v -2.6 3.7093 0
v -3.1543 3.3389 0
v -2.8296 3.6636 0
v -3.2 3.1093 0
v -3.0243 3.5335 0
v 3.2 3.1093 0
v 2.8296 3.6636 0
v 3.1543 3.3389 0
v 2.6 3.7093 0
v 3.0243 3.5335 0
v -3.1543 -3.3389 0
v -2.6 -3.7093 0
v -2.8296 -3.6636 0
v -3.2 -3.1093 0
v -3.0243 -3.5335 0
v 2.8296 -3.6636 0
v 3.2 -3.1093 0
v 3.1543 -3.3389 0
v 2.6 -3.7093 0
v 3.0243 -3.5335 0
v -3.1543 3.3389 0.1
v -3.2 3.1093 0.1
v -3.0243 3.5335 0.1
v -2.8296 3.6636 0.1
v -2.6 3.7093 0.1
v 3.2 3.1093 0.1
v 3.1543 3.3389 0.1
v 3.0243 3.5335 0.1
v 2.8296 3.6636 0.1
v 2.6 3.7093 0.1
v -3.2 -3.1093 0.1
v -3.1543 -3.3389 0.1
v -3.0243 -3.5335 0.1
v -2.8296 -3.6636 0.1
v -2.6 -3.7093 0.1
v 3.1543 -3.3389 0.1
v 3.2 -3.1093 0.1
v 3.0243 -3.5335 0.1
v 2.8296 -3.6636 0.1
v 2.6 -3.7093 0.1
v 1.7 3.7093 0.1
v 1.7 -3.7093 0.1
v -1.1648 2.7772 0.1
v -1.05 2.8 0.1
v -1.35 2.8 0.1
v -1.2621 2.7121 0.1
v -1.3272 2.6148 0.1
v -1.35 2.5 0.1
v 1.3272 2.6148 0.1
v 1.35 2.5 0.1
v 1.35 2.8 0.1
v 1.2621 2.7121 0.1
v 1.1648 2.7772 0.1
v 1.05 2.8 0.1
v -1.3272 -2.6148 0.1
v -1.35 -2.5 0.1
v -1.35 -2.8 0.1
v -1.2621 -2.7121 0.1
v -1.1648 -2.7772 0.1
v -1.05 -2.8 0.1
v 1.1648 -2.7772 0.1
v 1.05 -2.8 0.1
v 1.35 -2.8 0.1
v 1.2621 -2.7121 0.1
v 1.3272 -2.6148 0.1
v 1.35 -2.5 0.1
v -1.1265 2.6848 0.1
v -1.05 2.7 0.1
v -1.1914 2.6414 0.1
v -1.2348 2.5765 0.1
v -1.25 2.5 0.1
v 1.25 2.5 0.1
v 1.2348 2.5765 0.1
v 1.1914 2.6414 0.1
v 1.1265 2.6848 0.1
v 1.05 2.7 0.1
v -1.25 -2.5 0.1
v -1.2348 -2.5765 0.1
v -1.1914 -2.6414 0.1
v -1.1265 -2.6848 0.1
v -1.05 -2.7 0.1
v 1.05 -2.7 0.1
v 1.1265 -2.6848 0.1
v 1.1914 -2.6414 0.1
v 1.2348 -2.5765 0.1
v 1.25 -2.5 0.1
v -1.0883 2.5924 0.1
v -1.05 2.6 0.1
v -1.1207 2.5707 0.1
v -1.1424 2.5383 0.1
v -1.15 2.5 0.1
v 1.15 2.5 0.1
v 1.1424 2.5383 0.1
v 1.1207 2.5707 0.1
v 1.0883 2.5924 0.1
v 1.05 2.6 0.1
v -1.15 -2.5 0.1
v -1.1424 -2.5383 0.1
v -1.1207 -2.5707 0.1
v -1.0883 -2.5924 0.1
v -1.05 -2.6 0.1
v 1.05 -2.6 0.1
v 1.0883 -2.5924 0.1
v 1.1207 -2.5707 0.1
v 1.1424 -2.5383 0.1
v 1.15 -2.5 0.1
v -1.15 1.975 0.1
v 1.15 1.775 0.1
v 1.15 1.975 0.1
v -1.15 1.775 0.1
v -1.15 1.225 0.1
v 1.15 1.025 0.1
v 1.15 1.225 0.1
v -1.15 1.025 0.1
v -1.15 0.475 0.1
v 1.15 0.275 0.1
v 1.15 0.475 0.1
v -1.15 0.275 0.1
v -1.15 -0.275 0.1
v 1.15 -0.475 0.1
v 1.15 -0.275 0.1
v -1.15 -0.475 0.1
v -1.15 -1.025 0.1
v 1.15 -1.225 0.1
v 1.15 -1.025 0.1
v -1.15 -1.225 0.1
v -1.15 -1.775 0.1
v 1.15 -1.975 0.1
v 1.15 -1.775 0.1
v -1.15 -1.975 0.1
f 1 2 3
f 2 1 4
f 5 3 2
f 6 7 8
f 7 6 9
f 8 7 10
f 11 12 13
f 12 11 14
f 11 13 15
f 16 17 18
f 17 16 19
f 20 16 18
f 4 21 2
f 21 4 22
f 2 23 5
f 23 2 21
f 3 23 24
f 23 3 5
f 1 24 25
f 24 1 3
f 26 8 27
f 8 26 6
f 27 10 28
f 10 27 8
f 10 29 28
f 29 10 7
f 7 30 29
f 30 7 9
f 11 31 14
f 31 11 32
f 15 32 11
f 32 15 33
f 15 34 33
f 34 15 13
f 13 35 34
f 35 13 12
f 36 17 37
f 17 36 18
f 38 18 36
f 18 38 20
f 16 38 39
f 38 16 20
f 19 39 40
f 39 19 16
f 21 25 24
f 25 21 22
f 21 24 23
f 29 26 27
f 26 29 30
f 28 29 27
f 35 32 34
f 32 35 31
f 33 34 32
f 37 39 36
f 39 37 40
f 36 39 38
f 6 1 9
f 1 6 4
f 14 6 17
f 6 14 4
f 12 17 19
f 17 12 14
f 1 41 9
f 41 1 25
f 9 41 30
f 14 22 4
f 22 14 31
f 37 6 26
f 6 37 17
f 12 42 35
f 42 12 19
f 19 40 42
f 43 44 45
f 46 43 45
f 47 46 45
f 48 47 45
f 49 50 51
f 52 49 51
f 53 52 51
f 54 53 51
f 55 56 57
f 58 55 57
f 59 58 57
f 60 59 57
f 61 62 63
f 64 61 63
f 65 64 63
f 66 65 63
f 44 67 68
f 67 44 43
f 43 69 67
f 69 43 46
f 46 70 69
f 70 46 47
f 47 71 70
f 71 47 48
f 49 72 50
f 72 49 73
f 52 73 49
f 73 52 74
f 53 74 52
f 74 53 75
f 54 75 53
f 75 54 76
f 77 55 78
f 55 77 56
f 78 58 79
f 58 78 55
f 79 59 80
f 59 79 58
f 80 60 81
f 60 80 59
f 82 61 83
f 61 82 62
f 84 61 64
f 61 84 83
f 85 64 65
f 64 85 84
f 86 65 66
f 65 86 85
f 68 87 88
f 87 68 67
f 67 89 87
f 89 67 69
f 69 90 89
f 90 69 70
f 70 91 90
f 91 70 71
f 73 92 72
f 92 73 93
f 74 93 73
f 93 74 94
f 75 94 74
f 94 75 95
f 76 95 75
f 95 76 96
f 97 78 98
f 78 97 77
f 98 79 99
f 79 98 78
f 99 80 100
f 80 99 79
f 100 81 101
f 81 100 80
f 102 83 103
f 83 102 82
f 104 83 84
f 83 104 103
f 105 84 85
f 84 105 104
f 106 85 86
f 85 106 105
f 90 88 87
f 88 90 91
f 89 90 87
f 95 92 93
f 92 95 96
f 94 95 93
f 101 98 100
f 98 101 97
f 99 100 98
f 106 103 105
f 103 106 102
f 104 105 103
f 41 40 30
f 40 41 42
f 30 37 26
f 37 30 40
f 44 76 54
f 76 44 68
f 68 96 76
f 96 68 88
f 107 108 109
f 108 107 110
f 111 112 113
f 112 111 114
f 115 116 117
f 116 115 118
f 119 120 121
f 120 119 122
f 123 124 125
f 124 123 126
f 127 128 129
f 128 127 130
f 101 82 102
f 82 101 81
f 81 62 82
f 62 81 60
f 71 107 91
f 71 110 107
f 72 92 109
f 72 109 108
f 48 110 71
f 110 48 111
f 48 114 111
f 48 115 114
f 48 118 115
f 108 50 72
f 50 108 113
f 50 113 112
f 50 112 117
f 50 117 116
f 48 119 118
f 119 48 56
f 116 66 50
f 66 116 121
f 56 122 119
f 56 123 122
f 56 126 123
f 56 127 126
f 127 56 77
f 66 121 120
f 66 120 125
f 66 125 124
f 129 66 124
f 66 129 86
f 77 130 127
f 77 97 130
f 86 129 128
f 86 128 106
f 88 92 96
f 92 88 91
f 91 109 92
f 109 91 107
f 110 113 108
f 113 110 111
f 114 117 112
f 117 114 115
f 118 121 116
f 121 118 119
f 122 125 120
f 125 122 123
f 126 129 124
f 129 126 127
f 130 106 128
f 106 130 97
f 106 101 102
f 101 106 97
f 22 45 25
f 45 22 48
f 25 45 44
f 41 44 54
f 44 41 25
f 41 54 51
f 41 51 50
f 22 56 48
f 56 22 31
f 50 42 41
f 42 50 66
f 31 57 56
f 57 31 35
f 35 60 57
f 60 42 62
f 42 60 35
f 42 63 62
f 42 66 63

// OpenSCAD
// file: ../p/1-4ring2.scad
use <../lib.scad>
function ldraw_lib__1_4ring2() = [
// 0 Ring  2 x 0.25
// 0 Name: 1-4ring2.dat
// 0 Author: Franklin W. Cain [fwcain]
// 0 !LDRAW_ORG Primitive UPDATE 2015-01
// 0 !LICENSE Licensed under CC BY 2.0 and CC BY 4.0 : see CAreadme.txt
// 
// 0 BFC CERTIFY CCW
  [0,"BFC","CERTIFY"],
  [0,"BFC","CCW"],
// 
// 0 !HISTORY 2001-12-31 [PTadmin] Official Update 2001-03
// 0 !HISTORY 2007-06-22 [PTadmin] Header formatted for Contributor Agreement
// 0 !HISTORY 2008-07-01 [PTadmin] Official Update 2008-01
// 0 !HISTORY 2012-02-16 [Philo] Changed to CCW
// 0 !HISTORY 2012-03-30 [PTadmin] Official Update 2012-01
// 0 !HISTORY 2014-12-25 [MMR1988] Fixed a rounding issue
// 0 !HISTORY 2015-10-11 [PTadmin] Official Update 2015-01
// 
// 
// 4 16 3 0 0 2.7717 0 1.1481 1.8478 0 0.7654 2 0 0
  [4,16,3,0,0,2.7717,0,1.1481,1.8478,0,0.7654,2,0,0],
// 4 16 2.7717 0 1.1481 2.1213 0 2.1213 1.4142 0 1.4142 1.8478 0 0.7654
  [4,16,2.7717,0,1.1481,2.1213,0,2.1213,1.4142,0,1.4142,1.8478,0,0.7654],
// 4 16 2.1213 0 2.1213 1.1481 0 2.7717 0.7654 0 1.8478 1.4142 0 1.4142
  [4,16,2.1213,0,2.1213,1.1481,0,2.7717,0.7654,0,1.8478,1.4142,0,1.4142],
// 4 16 1.1481 0 2.7717 0 0 3 0 0 2 0.7654 0 1.8478
  [4,16,1.1481,0,2.7717,0,0,3,0,0,2,0.7654,0,1.8478],
// 0 // Build by Primitive Generator 2
];
makepoly(ldraw_lib__1_4ring2(), line=0.2);
// file: ../p/1-4ring1.scad
use <../lib.scad>
function ldraw_lib__1_4ring1() = [
// 0 Ring  1 x 0.25
// 0 Name: 1-4ring1.dat
// 0 Author: Chris Dee [cwdee]
// 0 !LDRAW_ORG Primitive UPDATE 2012-01
// 0 !LICENSE Licensed under CC BY 2.0 and CC BY 4.0 : see CAreadme.txt
// 
// 0 BFC CERTIFY CCW
  [0,"BFC","CERTIFY"],
  [0,"BFC","CCW"],
// 
// 0 !HISTORY 2000-05-07 [PTadmin] Official Update 2000-01
// 0 !HISTORY 2002-11-22 [hafhead] Added BFC statement
// 0 !HISTORY 2002-11-30 [PTadmin] Official Update 2002-05
// 0 !HISTORY 2007-06-22 [PTadmin] Header formatted for Contributor Agreement
// 0 !HISTORY 2008-07-01 [PTadmin] Official Update 2008-01
// 0 !HISTORY 2012-02-16 [Philo] Changed to CCW
// 0 !HISTORY 2012-03-30 [PTadmin] Official Update 2012-01
// 
// 
// 4 16 2 0 0 1.8478 0 0.7654 0.9239 0 0.3827 1 0 0
  [4,16,2,0,0,1.8478,0,0.7654,0.9239,0,0.3827,1,0,0],
// 4 16 1.8478 0 0.7654 1.4142 0 1.4142 0.7071 0 0.7071 0.9239 0 0.3827
  [4,16,1.8478,0,0.7654,1.4142,0,1.4142,0.7071,0,0.7071,0.9239,0,0.3827],
// 4 16 1.4142 0 1.4142 0.7654 0 1.8478 0.3827 0 0.9239 0.7071 0 0.7071
  [4,16,1.4142,0,1.4142,0.7654,0,1.8478,0.3827,0,0.9239,0.7071,0,0.7071],
// 4 16 0.7654 0 1.8478 0 0 2 0 0 1 0.3827 0 0.9239
  [4,16,0.7654,0,1.8478,0,0,2,0,0,1,0.3827,0,0.9239],
];
makepoly(ldraw_lib__1_4ring1(), line=0.2);
// file: ../p/1-4ndis.scad
use <../lib.scad>
function ldraw_lib__1_4ndis() = [
// 0 Disc Negative 0.25
// 0 Name: 1-4ndis.dat
// 0 Author: James Jessiman
// 0 !LDRAW_ORG Primitive UPDATE 2012-01
// 0 !LICENSE Licensed under CC BY 2.0 and CC BY 4.0 : see CAreadme.txt
// 
// 0 BFC CERTIFY CCW
  [0,"BFC","CERTIFY"],
  [0,"BFC","CCW"],
// 
// 0 !HISTORY 2002-03-23 [sbliss] Added BFC Statement
// 0 !HISTORY 2002-04-25 [PTadmin] Official Update 2002-02
// 0 !HISTORY 2007-06-22 [PTadmin] Header formatted for Contributor Agreement
// 0 !HISTORY 2008-07-01 [PTadmin] Official Update 2008-01
// 0 !HISTORY 2012-02-16 [Philo] Changed to CCW
// 0 !HISTORY 2012-03-30 [PTadmin] Official Update 2012-01
// 
// 
// 3 16 0.9239 0 0.3827 1 0 0 1 0 1
  [3,16,0.9239,0,0.3827,1,0,0,1,0,1],
// 3 16 0.7071 0 0.7071 0.9239 0 0.3827 1 0 1
  [3,16,0.7071,0,0.7071,0.9239,0,0.3827,1,0,1],
// 3 16 0.3827 0 0.9239 0.7071 0 0.7071 1 0 1
  [3,16,0.3827,0,0.9239,0.7071,0,0.7071,1,0,1],
// 3 16 0 0 1 0.3827 0 0.9239 1 0 1
  [3,16,0,0,1,0.3827,0,0.9239,1,0,1],
];
makepoly(ldraw_lib__1_4ndis(), line=0.2);
// file: ../p/1-4cyli.scad
use <../lib.scad>
function ldraw_lib__1_4cyli() = [
// 0 Cylinder 0.25
// 0 Name: 1-4cyli.dat
// 0 Author: James Jessiman
// 0 !LDRAW_ORG Primitive UPDATE 2012-01
// 0 !LICENSE Licensed under CC BY 2.0 and CC BY 4.0 : see CAreadme.txt
// 
// 0 BFC CERTIFY CCW
  [0,"BFC","CERTIFY"],
  [0,"BFC","CCW"],
// 
// 0 !HISTORY 2002-03-23 [sbliss] Added BFC statement.
// 0 !HISTORY 2002-04-25 [PTadmin] Official Update 2002-02
// 0 !HISTORY 2007-06-22 [PTadmin] Header formatted for Contributor Agreement
// 0 !HISTORY 2008-07-01 [PTadmin] Official Update 2008-01
// 0 !HISTORY 2012-02-16 [Philo] Changed to CCW
// 0 !HISTORY 2012-03-30 [PTadmin] Official Update 2012-01
// 
// 
// 4 16 1 1 0 0.9239 1 0.3827 0.9239 0 0.3827 1 0 0
  [4,16,1,1,0,0.9239,1,0.3827,0.9239,0,0.3827,1,0,0],
// 5 24 1 0 0 1 1 0 0.9239 0 0.3827 1 0 -1
  [5,24,1,0,0,1,1,0,0.9239,0,0.3827,1,0,-1],
// 4 16 0.9239 1 0.3827 0.7071 1 0.7071 0.7071 0 0.7071 0.9239 0 0.3827
  [4,16,0.9239,1,0.3827,0.7071,1,0.7071,0.7071,0,0.7071,0.9239,0,0.3827],
// 5 24 0.9239 0 0.3827 0.9239 1 0.3827 0.7071 0 0.7071 1 0 0
  [5,24,0.9239,0,0.3827,0.9239,1,0.3827,0.7071,0,0.7071,1,0,0],
// 4 16 0.7071 1 0.7071 0.3827 1 0.9239 0.3827 0 0.9239 0.7071 0 0.7071
  [4,16,0.7071,1,0.7071,0.3827,1,0.9239,0.3827,0,0.9239,0.7071,0,0.7071],
// 5 24 0.7071 0 0.7071 0.7071 1 0.7071 0.3827 0 0.9239 0.9239 0 0.3827
  [5,24,0.7071,0,0.7071,0.7071,1,0.7071,0.3827,0,0.9239,0.9239,0,0.3827],
// 4 16 0.3827 1 0.9239 0 1 1 0 0 1 0.3827 0 0.9239
  [4,16,0.3827,1,0.9239,0,1,1,0,0,1,0.3827,0,0.9239],
// 5 24 0.3827 0 0.9239 0.3827 1 0.9239 0 0 1 0.7071 0 0.7071
  [5,24,0.3827,0,0.9239,0.3827,1,0.9239,0,0,1,0.7071,0,0.7071],
// 5 24 0 0 1 0 1 1 0.3827 0 0.9239 -1 0 1
  [5,24,0,0,1,0,1,1,0.3827,0,0.9239,-1,0,1],
];
makepoly(ldraw_lib__1_4cyli(), line=0.2);
// file: ../p/1-4chrd.scad
use <../lib.scad>
function ldraw_lib__1_4chrd() = [
// 0 Chord 0.25
// 0 Name: 1-4chrd.dat
// 0 Author: Tony Hafner [hafhead]
// 0 !LDRAW_ORG Primitive UPDATE 2012-02
// 0 !LICENSE Licensed under CC BY 2.0 and CC BY 4.0 : see CAreadme.txt
// 
// 0 BFC CERTIFY CCW
  [0,"BFC","CERTIFY"],
  [0,"BFC","CCW"],
// 
// 0 !HISTORY 2004-04-22 [PTadmin] Official Update 2004-02
// 0 !HISTORY 2007-10-09 [PTadmin] Header formatted for Contributor Agreement
// 0 !HISTORY 2008-07-01 [PTadmin] Official Update 2008-01
// 0 !HISTORY 2012-08-02 [MMR1988] Re-creation with PrimGen2 and Rectifier
// 0 !HISTORY 2012-08-09 [PTadmin] Official Update 2012-02
// 
// 
// 4 16 0.9239 0 0.3827 0.3827 0 0.9239 0 0 1 1 0 0
  [4,16,0.9239,0,0.3827,0.3827,0,0.9239,0,0,1,1,0,0],
// 3 16 0.7071 0 0.7071 0.3827 0 0.9239 0.9239 0 0.3827
  [3,16,0.7071,0,0.7071,0.3827,0,0.9239,0.9239,0,0.3827],
];
makepoly(ldraw_lib__1_4chrd(), line=0.2);
// main file
use <../lib.scad>
use <../p/1-4chrd.scad>
use <../p/1-4cyli.scad>
use <../p/1-4ndis.scad>
use <../p/1-4ring1.scad>
use <../p/1-4ring2.scad>
function ldraw_lib__6142622g() = [
// 0 Sticker  1.0 x  0.9 with Dark Grey Exhaust Pipe on Black and Yellow Background Right
// 0 Name: 6142622g.dat
// 0 Author: Massimo Maso [Sirio]
// 0 !LDRAW_ORG Part UPDATE 2022-03
// 0 !LICENSE Licensed under CC BY 2.0 and CC BY 4.0 : see CAreadme.txt
// 
// 0 BFC CERTIFY CCW
  [0,"BFC","CERTIFY"],
  [0,"BFC","CCW"],
// 
// 0 !KEYWORDS Chevrolet, Corvette, Set 75870, Speed Champions
// 
// 0 !HISTORY 2022-05-07 [PTadmin] Official Update 2022-03
// 
// 
// 0 // Primitives
// 
// 1 16 -6.5 0 7.7732 -1.5 0 0 0 -1 0 0 0 1.5 1-4chrd.dat
  [1,16,-6.5,0,7.7732,-1.5,0,0,0,-1,0,0,0,1.5, ldraw_lib__1_4chrd()],
// 1 16 6.5 0 7.7732 1.5 0 0 0 -1 0 0 0 1.5 1-4chrd.dat
  [1,16,6.5,0,7.7732,1.5,0,0,0,-1,0,0,0,1.5, ldraw_lib__1_4chrd()],
// 1 16 -6.5 0 -7.7732 -1.5 0 0 0 -1 0 0 0 -1.5 1-4chrd.dat
  [1,16,-6.5,0,-7.7732,-1.5,0,0,0,-1,0,0,0,-1.5, ldraw_lib__1_4chrd()],
// 1 16 6.5 0 -7.7732 1.5 0 0 0 -1 0 0 0 -1.5 1-4chrd.dat
  [1,16,6.5,0,-7.7732,1.5,0,0,0,-1,0,0,0,-1.5, ldraw_lib__1_4chrd()],
// 1 16 -6.5 0 7.7732 -1.5 0 0 0 -.25 0 0 0 1.5 1-4cyli.dat
  [1,16,-6.5,0,7.7732,-1.5,0,0,0,-.25,0,0,0,1.5, ldraw_lib__1_4cyli()],
// 1 16 6.5 0 7.7732 1.5 0 0 0 -.25 0 0 0 1.5 1-4cyli.dat
  [1,16,6.5,0,7.7732,1.5,0,0,0,-.25,0,0,0,1.5, ldraw_lib__1_4cyli()],
// 1 16 -6.5 0 -7.7732 -1.5 0 0 0 -.25 0 0 0 -1.5 1-4cyli.dat
  [1,16,-6.5,0,-7.7732,-1.5,0,0,0,-.25,0,0,0,-1.5, ldraw_lib__1_4cyli()],
// 1 16 6.5 0 -7.7732 1.5 0 0 0 -.25 0 0 0 -1.5 1-4cyli.dat
  [1,16,6.5,0,-7.7732,1.5,0,0,0,-.25,0,0,0,-1.5, ldraw_lib__1_4cyli()],
// 1 0 -6.5 -.25 7.7732 -1.5 0 0 0 1 0 0 0 1.5 1-4chrd.dat
  [1,0,-6.5,-.25,7.7732,-1.5,0,0,0,1,0,0,0,1.5, ldraw_lib__1_4chrd()],
// 1 14 6.5 -.25 7.7732 1.5 0 0 0 1 0 0 0 1.5 1-4chrd.dat
  [1,14,6.5,-.25,7.7732,1.5,0,0,0,1,0,0,0,1.5, ldraw_lib__1_4chrd()],
// 1 0 -6.5 -.25 -7.7732 -1.5 0 0 0 1 0 0 0 -1.5 1-4chrd.dat
  [1,0,-6.5,-.25,-7.7732,-1.5,0,0,0,1,0,0,0,-1.5, ldraw_lib__1_4chrd()],
// 1 14 6.5 -.25 -7.7732 1.5 0 0 0 1 0 0 0 -1.5 1-4chrd.dat
  [1,14,6.5,-.25,-7.7732,1.5,0,0,0,1,0,0,0,-1.5, ldraw_lib__1_4chrd()],
// 0 // Bottom face
// 4 16 6.5 0 9.2732 8 0 7.7732 -8 0 7.7732 -6.5 0 9.2732
  [4,16,6.5,0,9.2732,8,0,7.7732,-8,0,7.7732,-6.5,0,9.2732],
// 4 16 8 0 7.7732 8 0 -7.7732 -8 0 -7.7732 -8 0 7.7732
  [4,16,8,0,7.7732,8,0,-7.7732,-8,0,-7.7732,-8,0,7.7732],
// 4 16 8 0 -7.7732 6.5 0 -9.2732 -6.5 0 -9.2732 -8 0 -7.7732
  [4,16,8,0,-7.7732,6.5,0,-9.2732,-6.5,0,-9.2732,-8,0,-7.7732],
// 0 // Lateral face
// 4 16 -6.5 0 9.2732 -6.5 -.25 9.2732 4.25 -.25 9.2732 6.5 0 9.2732
  [4,16,-6.5,0,9.2732,-6.5,-.25,9.2732,4.25,-.25,9.2732,6.5,0,9.2732],
// 3 16 6.5 0 9.2732 4.25 -.25 9.2732 6.5 -.25 9.2732
  [3,16,6.5,0,9.2732,4.25,-.25,9.2732,6.5,-.25,9.2732],
// 4 16 -8 0 7.7732 -8 0 -7.7732 -8 -.25 -7.7732 -8 -.25 7.7732
  [4,16,-8,0,7.7732,-8,0,-7.7732,-8,-.25,-7.7732,-8,-.25,7.7732],
// 4 16 8 -0.25 7.7732 8 -0.25 -7.7732 8 0 -7.7732 8 0 7.7732
  [4,16,8,-0.25,7.7732,8,-0.25,-7.7732,8,0,-7.7732,8,0,7.7732],
// 4 16 -6.5 0 -9.2732 6.5 0 -9.2732 4.25 -.25 -9.2732 -6.5 -.25 -9.2732
  [4,16,-6.5,0,-9.2732,6.5,0,-9.2732,4.25,-.25,-9.2732,-6.5,-.25,-9.2732],
// 3 16 6.5 0 -9.2732 6.5 -.25 -9.2732 4.25 -.25 -9.2732
  [3,16,6.5,0,-9.2732,6.5,-.25,-9.2732,4.25,-.25,-9.2732],
// 0 // Top face
// 0 // Primitives
// 1 0 -2.625 -.25 6.25 0 0 -.75 0 1 0 .75 0 0 1-4ndis.dat
  [1,0,-2.625,-.25,6.25,0,0,-.75,0,1,0,.75,0,0, ldraw_lib__1_4ndis()],
// 1 0 2.625 -.25 6.25 .75 0 0 0 1 0 0 0 .75 1-4ndis.dat
  [1,0,2.625,-.25,6.25,.75,0,0,0,1,0,0,0,.75, ldraw_lib__1_4ndis()],
// 1 0 -2.625 -.25 -6.25 -.75 0 0 0 1 0 0 0 -.75 1-4ndis.dat
  [1,0,-2.625,-.25,-6.25,-.75,0,0,0,1,0,0,0,-.75, ldraw_lib__1_4ndis()],
// 1 0 2.625 -.25 -6.25 0 0 .75 0 1 0 -.75 0 0 1-4ndis.dat
  [1,0,2.625,-.25,-6.25,0,0,.75,0,1,0,-.75,0,0, ldraw_lib__1_4ndis()],
// 1 72 -2.625 -.25 6.25 0 0 -.25 0 1 0 .25 0 0 1-4ring2.dat
  [1,72,-2.625,-.25,6.25,0,0,-.25,0,1,0,.25,0,0, ldraw_lib__1_4ring2()],
// 1 72 2.625 -.25 6.25 .25 0 0 0 1 0 0 0 .25 1-4ring2.dat
  [1,72,2.625,-.25,6.25,.25,0,0,0,1,0,0,0,.25, ldraw_lib__1_4ring2()],
// 1 72 -2.625 -.25 -6.25 -.25 0 0 0 1 0 0 0 -.25 1-4ring2.dat
  [1,72,-2.625,-.25,-6.25,-.25,0,0,0,1,0,0,0,-.25, ldraw_lib__1_4ring2()],
// 1 72 2.625 -.25 -6.25 0 0 .25 0 1 0 -.25 0 0 1-4ring2.dat
  [1,72,2.625,-.25,-6.25,0,0,.25,0,1,0,-.25,0,0, ldraw_lib__1_4ring2()],
// 1 72 -2.625 -.25 6.25 0 0 -.25 0 1 0 .25 0 0 1-4ring1.dat
  [1,72,-2.625,-.25,6.25,0,0,-.25,0,1,0,.25,0,0, ldraw_lib__1_4ring1()],
// 1 72 2.625 -.25 6.25 .25 0 0 0 1 0 0 0 .25 1-4ring1.dat
  [1,72,2.625,-.25,6.25,.25,0,0,0,1,0,0,0,.25, ldraw_lib__1_4ring1()],
// 1 72 -2.625 -.25 -6.25 -.25 0 0 0 1 0 0 0 -.25 1-4ring1.dat
  [1,72,-2.625,-.25,-6.25,-.25,0,0,0,1,0,0,0,-.25, ldraw_lib__1_4ring1()],
// 1 72 2.625 -.25 -6.25 0 0 .25 0 1 0 -.25 0 0 1-4ring1.dat
  [1,72,2.625,-.25,-6.25,0,0,.25,0,1,0,-.25,0,0, ldraw_lib__1_4ring1()],
// 1 0 -2.625 -.25 6.25 0 0 -.25 0 1 0 .25 0 0 1-4chrd.dat
  [1,0,-2.625,-.25,6.25,0,0,-.25,0,1,0,.25,0,0, ldraw_lib__1_4chrd()],
// 1 0 2.625 -.25 6.25 .25 0 0 0 1 0 0 0 .25 1-4chrd.dat
  [1,0,2.625,-.25,6.25,.25,0,0,0,1,0,0,0,.25, ldraw_lib__1_4chrd()],
// 1 0 -2.625 -.25 -6.25 -.25 0 0 0 1 0 0 0 -.25 1-4chrd.dat
  [1,0,-2.625,-.25,-6.25,-.25,0,0,0,1,0,0,0,-.25, ldraw_lib__1_4chrd()],
// 1 0 2.625 -.25 -6.25 0 0 .25 0 1 0 -.25 0 0 1-4chrd.dat
  [1,0,2.625,-.25,-6.25,0,0,.25,0,1,0,-.25,0,0, ldraw_lib__1_4chrd()],
// 0 // Yellow faces
// 4 14 6.5 -.25 9.2732 4.25 -.25 9.2732 4.25 -.25 -9.2732 6.5 -.25 -9.2732
  [4,14,6.5,-.25,9.2732,4.25,-.25,9.2732,4.25,-.25,-9.2732,6.5,-.25,-9.2732],
// 4 14 6.5 -.25 9.2732 6.5 -.25 -9.2732 8 -.25 -7.7732 8 -.25 7.7732
  [4,14,6.5,-.25,9.2732,6.5,-.25,-9.2732,8,-.25,-7.7732,8,-.25,7.7732],
// 0 // Dark grey faces
// 4 72 -2.625 -.25 6.75 2.625 -.25 6.75 2.625 -.25 7 -2.625 -.25 7
  [4,72,-2.625,-.25,6.75,2.625,-.25,6.75,2.625,-.25,7,-2.625,-.25,7],
// 4 72 -2.625 -.25 6.75 -2.625 -.25 6.5 2.625 -.25 6.5 2.625 -.25 6.75
  [4,72,-2.625,-.25,6.75,-2.625,-.25,6.5,2.625,-.25,6.5,2.625,-.25,6.75],
// 4 72 -2.875 -.25 4.9375 -2.875 -.25 4.4375 2.875 -.25 4.4375 2.875 -.25 4.9375
  [4,72,-2.875,-.25,4.9375,-2.875,-.25,4.4375,2.875,-.25,4.4375,2.875,-.25,4.9375],
// 4 72 -2.875 -.25 3.0625 -2.875 -.25 2.5625 2.875 -.25 2.5625 2.875 -.25 3.0625
  [4,72,-2.875,-.25,3.0625,-2.875,-.25,2.5625,2.875,-.25,2.5625,2.875,-.25,3.0625],
// 4 72 -2.875 -.25 1.1875 -2.875 -.25 .6875 2.875 -.25 .6875 2.875 -.25 1.1875
  [4,72,-2.875,-.25,1.1875,-2.875,-.25,.6875,2.875,-.25,.6875,2.875,-.25,1.1875],
// 4 72 -2.875 -.25 -.6875 -2.875 -.25 -1.1875 2.875 -.25 -1.1875 2.875 -.25 -.6875
  [4,72,-2.875,-.25,-.6875,-2.875,-.25,-1.1875,2.875,-.25,-1.1875,2.875,-.25,-.6875],
// 4 72 -2.875 -.25 -2.5625 -2.875 -.25 -3.0625 2.875 -.25 -3.0625 2.875 -.25 -2.5625
  [4,72,-2.875,-.25,-2.5625,-2.875,-.25,-3.0625,2.875,-.25,-3.0625,2.875,-.25,-2.5625],
// 4 72 -2.875 -.25 -4.4375 -2.875 -.25 -4.9375 2.875 -.25 -4.9375 2.875 -.25 -4.4375
  [4,72,-2.875,-.25,-4.4375,-2.875,-.25,-4.9375,2.875,-.25,-4.9375,2.875,-.25,-4.4375],
// 4 72 -2.625 -.25 -6.75 2.625 -.25 -6.75 2.625 -.25 -6.5 -2.625 -.25 -6.5
  [4,72,-2.625,-.25,-6.75,2.625,-.25,-6.75,2.625,-.25,-6.5,-2.625,-.25,-6.5],
// 4 72 -2.625 -.25 -6.75 -2.625 -.25 -7 2.625 -.25 -7 2.625 -.25 -6.75
  [4,72,-2.625,-.25,-6.75,-2.625,-.25,-7,2.625,-.25,-7,2.625,-.25,-6.75],
// 3 72 -3.125 -.25 6.25 -2.875 -.25 4.9375 -2.875 -.25 6.25
  [3,72,-3.125,-.25,6.25,-2.875,-.25,4.9375,-2.875,-.25,6.25],
// 3 72 -3.125 -.25 6.25 -2.875 -.25 4.4375 -2.875 -.25 4.9375
  [3,72,-3.125,-.25,6.25,-2.875,-.25,4.4375,-2.875,-.25,4.9375],
// 3 72 3.125 -.25 6.25 2.875 -.25 6.25 2.875 -.25 4.9375
  [3,72,3.125,-.25,6.25,2.875,-.25,6.25,2.875,-.25,4.9375],
// 3 72 3.125 -.25 6.25 2.875 -.25 4.9375 2.875 -.25 4.4375
  [3,72,3.125,-.25,6.25,2.875,-.25,4.9375,2.875,-.25,4.4375],
// 4 72 -3.375 -.25 6.25 -2.875 -.25 3.0625 -2.875 -.25 4.4375 -3.125 -.25 6.25
  [4,72,-3.375,-.25,6.25,-2.875,-.25,3.0625,-2.875,-.25,4.4375,-3.125,-.25,6.25],
// 3 72 -3.375 -.25 6.25 -2.875 -.25 2.5625 -2.875 -.25 3.0625
  [3,72,-3.375,-.25,6.25,-2.875,-.25,2.5625,-2.875,-.25,3.0625],
// 3 72 -3.375 -.25 6.25 -2.875 -.25 1.1875 -2.875 -.25 2.5625
  [3,72,-3.375,-.25,6.25,-2.875,-.25,1.1875,-2.875,-.25,2.5625],
// 3 72 -3.375 -.25 6.25 -2.875 -.25 .6875 -2.875 -.25 1.1875
  [3,72,-3.375,-.25,6.25,-2.875,-.25,.6875,-2.875,-.25,1.1875],
// 4 72 3.375 -.25 6.25 3.125 -.25 6.25 2.875 -.25 4.4375 2.875 -.25 3.0625
  [4,72,3.375,-.25,6.25,3.125,-.25,6.25,2.875,-.25,4.4375,2.875,-.25,3.0625],
// 3 72 3.375 -.25 6.25 2.875 -.25 3.0625 2.875 -.25 2.5625
  [3,72,3.375,-.25,6.25,2.875,-.25,3.0625,2.875,-.25,2.5625],
// 3 72 3.375 -.25 6.25 2.875 -.25 2.5625 2.875 -.25 1.1875
  [3,72,3.375,-.25,6.25,2.875,-.25,2.5625,2.875,-.25,1.1875],
// 3 72 3.375 -.25 6.25 2.875 -.25 1.1875 2.875 -.25 .6875
  [3,72,3.375,-.25,6.25,2.875,-.25,1.1875,2.875,-.25,.6875],
// 4 72 -3.375 -.25 6.25 -3.375 -.25 -6.25 -2.875 -.25 -.6875 -2.875 -.25 .6875
  [4,72,-3.375,-.25,6.25,-3.375,-.25,-6.25,-2.875,-.25,-.6875,-2.875,-.25,.6875],
// 4 72 3.375 -.25 6.25 2.875 -.25 .6875 2.875 -.25 -.6875 3.375 -.25 -6.25
  [4,72,3.375,-.25,6.25,2.875,-.25,.6875,2.875,-.25,-.6875,3.375,-.25,-6.25],
// 3 72 -3.375 -.25 -6.25 -2.875 -.25 -1.1875 -2.875 -.25 -.6875
  [3,72,-3.375,-.25,-6.25,-2.875,-.25,-1.1875,-2.875,-.25,-.6875],
// 3 72 -3.375 -.25 -6.25 -2.875 -.25 -2.5625 -2.875 -.25 -1.1875
  [3,72,-3.375,-.25,-6.25,-2.875,-.25,-2.5625,-2.875,-.25,-1.1875],
// 3 72 -3.375 -.25 -6.25 -2.875 -.25 -3.0625 -2.875 -.25 -2.5625
  [3,72,-3.375,-.25,-6.25,-2.875,-.25,-3.0625,-2.875,-.25,-2.5625],
// 4 72 -3.375 -.25 -6.25 -3.125 -.25 -6.25 -2.875 -.25 -4.4375 -2.875 -.25 -3.0625
  [4,72,-3.375,-.25,-6.25,-3.125,-.25,-6.25,-2.875,-.25,-4.4375,-2.875,-.25,-3.0625],
// 3 72 3.375 -.25 -6.25 2.875 -.25 -.6875 2.875 -.25 -1.1875
  [3,72,3.375,-.25,-6.25,2.875,-.25,-.6875,2.875,-.25,-1.1875],
// 3 72 3.375 -.25 -6.25 2.875 -.25 -1.1875 2.875 -.25 -2.5625
  [3,72,3.375,-.25,-6.25,2.875,-.25,-1.1875,2.875,-.25,-2.5625],
// 3 72 3.375 -.25 -6.25 2.875 -.25 -2.5625 2.875 -.25 -3.0625
  [3,72,3.375,-.25,-6.25,2.875,-.25,-2.5625,2.875,-.25,-3.0625],
// 4 72 3.375 -.25 -6.25 2.875 -.25 -3.0625 2.875 -.25 -4.4375 3.125 -.25 -6.25
  [4,72,3.375,-.25,-6.25,2.875,-.25,-3.0625,2.875,-.25,-4.4375,3.125,-.25,-6.25],
// 3 72 -3.125 -.25 -6.25 -2.875 -.25 -4.9375 -2.875 -.25 -4.4375
  [3,72,-3.125,-.25,-6.25,-2.875,-.25,-4.9375,-2.875,-.25,-4.4375],
// 3 72 -3.125 -.25 -6.25 -2.875 -.25 -6.25 -2.875 -.25 -4.9375
  [3,72,-3.125,-.25,-6.25,-2.875,-.25,-6.25,-2.875,-.25,-4.9375],
// 3 72 3.125 -.25 -6.25 2.875 -.25 -4.4375 2.875 -.25 -4.9375
  [3,72,3.125,-.25,-6.25,2.875,-.25,-4.4375,2.875,-.25,-4.9375],
// 3 72 3.125 -.25 -6.25 2.875 -.25 -4.9375 2.875 -.25 -6.25
  [3,72,3.125,-.25,-6.25,2.875,-.25,-4.9375,2.875,-.25,-6.25],
// 0 // Black faces
// 4 0 -2.875 -.25 6.25 2.875 -.25 6.25 2.625 -.25 6.5 -2.625 -.25 6.5
  [4,0,-2.875,-.25,6.25,2.875,-.25,6.25,2.625,-.25,6.5,-2.625,-.25,6.5],
// 4 0 -2.875 -.25 6.25 -2.875 -.25 4.9375 2.875 -.25 4.9375 2.875 -.25 6.25
  [4,0,-2.875,-.25,6.25,-2.875,-.25,4.9375,2.875,-.25,4.9375,2.875,-.25,6.25],
// 4 0 -2.875 -.25 4.4375 -2.875 -.25 3.0625 2.875 -.25 3.0625 2.875 -.25 4.4375
  [4,0,-2.875,-.25,4.4375,-2.875,-.25,3.0625,2.875,-.25,3.0625,2.875,-.25,4.4375],
// 4 0 -2.875 -.25 2.5625 -2.875 -.25 1.1875 2.875 -.25 1.1875 2.875 -.25 2.5625
  [4,0,-2.875,-.25,2.5625,-2.875,-.25,1.1875,2.875,-.25,1.1875,2.875,-.25,2.5625],
// 4 0 -2.875 -.25 .6875 -2.875 -.25 -.6875 2.875 -.25 -.6875 2.875 -.25 .6875
  [4,0,-2.875,-.25,.6875,-2.875,-.25,-.6875,2.875,-.25,-.6875,2.875,-.25,.6875],
// 4 0 -2.875 -.25 -1.1875 -2.875 -.25 -2.5625 2.875 -.25 -2.5625 2.875 -.25 -1.1875
  [4,0,-2.875,-.25,-1.1875,-2.875,-.25,-2.5625,2.875,-.25,-2.5625,2.875,-.25,-1.1875],
// 4 0 -2.875 -.25 -3.0625 -2.875 -.25 -4.4375 2.875 -.25 -4.4375 2.875 -.25 -3.0625
  [4,0,-2.875,-.25,-3.0625,-2.875,-.25,-4.4375,2.875,-.25,-4.4375,2.875,-.25,-3.0625],
// 4 0 -2.875 -.25 -6.25 2.875 -.25 -6.25 2.875 -.25 -4.9375 -2.875 -.25 -4.9375
  [4,0,-2.875,-.25,-6.25,2.875,-.25,-6.25,2.875,-.25,-4.9375,-2.875,-.25,-4.9375],
// 4 0 -2.875 -.25 -6.25 -2.625 -.25 -6.5 2.625 -.25 -6.5 2.875 -.25 -6.25
  [4,0,-2.875,-.25,-6.25,-2.625,-.25,-6.5,2.625,-.25,-6.5,2.875,-.25,-6.25],
// 4 0 -6.5 -.25 9.2732 -8 -.25 7.7732 -3.375 -.25 6.25 -3.375 -.25 7
  [4,0,-6.5,-.25,9.2732,-8,-.25,7.7732,-3.375,-.25,6.25,-3.375,-.25,7],
// 3 0 -6.5 -.25 9.2732 -3.375 -.25 7 -2.625 -.25 7
  [3,0,-6.5,-.25,9.2732,-3.375,-.25,7,-2.625,-.25,7],
// 4 0 -6.5 -.25 9.2732 -2.625 -.25 7 2.625 -.25 7 4.25 -.25 9.2732
  [4,0,-6.5,-.25,9.2732,-2.625,-.25,7,2.625,-.25,7,4.25,-.25,9.2732],
// 3 0 4.25 -.25 9.2732 2.625 -.25 7 3.375 -.25 7
  [3,0,4.25,-.25,9.2732,2.625,-.25,7,3.375,-.25,7],
// 3 0 4.25 -.25 9.2732 3.375 -.25 7 3.375 -.25 6.25
  [3,0,4.25,-.25,9.2732,3.375,-.25,7,3.375,-.25,6.25],
// 4 0 -8 -.25 7.7732 -8 -.25 -7.7732 -3.375 -.25 -6.25 -3.375 -.25 6.25
  [4,0,-8,-.25,7.7732,-8,-.25,-7.7732,-3.375,-.25,-6.25,-3.375,-.25,6.25],
// 4 0 4.25 -.25 9.2732 3.375 -.25 6.25 3.375 -.25 -6.25 4.25 -.25 -9.2732
  [4,0,4.25,-.25,9.2732,3.375,-.25,6.25,3.375,-.25,-6.25,4.25,-.25,-9.2732],
// 4 0 -6.5 -.25 -9.2732 -3.375 -.25 -7 -3.375 -.25 -6.25 -8 -.25 -7.7732
  [4,0,-6.5,-.25,-9.2732,-3.375,-.25,-7,-3.375,-.25,-6.25,-8,-.25,-7.7732],
// 3 0 -6.5 -.25 -9.2732 -2.625 -.25 -7 -3.375 -.25 -7
  [3,0,-6.5,-.25,-9.2732,-2.625,-.25,-7,-3.375,-.25,-7],
// 4 0 -6.5 -.25 -9.2732 4.25 -.25 -9.2732 2.625 -.25 -7 -2.625 -.25 -7
  [4,0,-6.5,-.25,-9.2732,4.25,-.25,-9.2732,2.625,-.25,-7,-2.625,-.25,-7],
// 3 0 4.25 -.25 -9.2732 3.375 -.25 -7 2.625 -.25 -7
  [3,0,4.25,-.25,-9.2732,3.375,-.25,-7,2.625,-.25,-7],
// 3 0 4.25 -.25 -9.2732 3.375 -.25 -6.25 3.375 -.25 -7
  [3,0,4.25,-.25,-9.2732,3.375,-.25,-6.25,3.375,-.25,-7],
];
makepoly(ldraw_lib__6142622g(), line=0.2);
